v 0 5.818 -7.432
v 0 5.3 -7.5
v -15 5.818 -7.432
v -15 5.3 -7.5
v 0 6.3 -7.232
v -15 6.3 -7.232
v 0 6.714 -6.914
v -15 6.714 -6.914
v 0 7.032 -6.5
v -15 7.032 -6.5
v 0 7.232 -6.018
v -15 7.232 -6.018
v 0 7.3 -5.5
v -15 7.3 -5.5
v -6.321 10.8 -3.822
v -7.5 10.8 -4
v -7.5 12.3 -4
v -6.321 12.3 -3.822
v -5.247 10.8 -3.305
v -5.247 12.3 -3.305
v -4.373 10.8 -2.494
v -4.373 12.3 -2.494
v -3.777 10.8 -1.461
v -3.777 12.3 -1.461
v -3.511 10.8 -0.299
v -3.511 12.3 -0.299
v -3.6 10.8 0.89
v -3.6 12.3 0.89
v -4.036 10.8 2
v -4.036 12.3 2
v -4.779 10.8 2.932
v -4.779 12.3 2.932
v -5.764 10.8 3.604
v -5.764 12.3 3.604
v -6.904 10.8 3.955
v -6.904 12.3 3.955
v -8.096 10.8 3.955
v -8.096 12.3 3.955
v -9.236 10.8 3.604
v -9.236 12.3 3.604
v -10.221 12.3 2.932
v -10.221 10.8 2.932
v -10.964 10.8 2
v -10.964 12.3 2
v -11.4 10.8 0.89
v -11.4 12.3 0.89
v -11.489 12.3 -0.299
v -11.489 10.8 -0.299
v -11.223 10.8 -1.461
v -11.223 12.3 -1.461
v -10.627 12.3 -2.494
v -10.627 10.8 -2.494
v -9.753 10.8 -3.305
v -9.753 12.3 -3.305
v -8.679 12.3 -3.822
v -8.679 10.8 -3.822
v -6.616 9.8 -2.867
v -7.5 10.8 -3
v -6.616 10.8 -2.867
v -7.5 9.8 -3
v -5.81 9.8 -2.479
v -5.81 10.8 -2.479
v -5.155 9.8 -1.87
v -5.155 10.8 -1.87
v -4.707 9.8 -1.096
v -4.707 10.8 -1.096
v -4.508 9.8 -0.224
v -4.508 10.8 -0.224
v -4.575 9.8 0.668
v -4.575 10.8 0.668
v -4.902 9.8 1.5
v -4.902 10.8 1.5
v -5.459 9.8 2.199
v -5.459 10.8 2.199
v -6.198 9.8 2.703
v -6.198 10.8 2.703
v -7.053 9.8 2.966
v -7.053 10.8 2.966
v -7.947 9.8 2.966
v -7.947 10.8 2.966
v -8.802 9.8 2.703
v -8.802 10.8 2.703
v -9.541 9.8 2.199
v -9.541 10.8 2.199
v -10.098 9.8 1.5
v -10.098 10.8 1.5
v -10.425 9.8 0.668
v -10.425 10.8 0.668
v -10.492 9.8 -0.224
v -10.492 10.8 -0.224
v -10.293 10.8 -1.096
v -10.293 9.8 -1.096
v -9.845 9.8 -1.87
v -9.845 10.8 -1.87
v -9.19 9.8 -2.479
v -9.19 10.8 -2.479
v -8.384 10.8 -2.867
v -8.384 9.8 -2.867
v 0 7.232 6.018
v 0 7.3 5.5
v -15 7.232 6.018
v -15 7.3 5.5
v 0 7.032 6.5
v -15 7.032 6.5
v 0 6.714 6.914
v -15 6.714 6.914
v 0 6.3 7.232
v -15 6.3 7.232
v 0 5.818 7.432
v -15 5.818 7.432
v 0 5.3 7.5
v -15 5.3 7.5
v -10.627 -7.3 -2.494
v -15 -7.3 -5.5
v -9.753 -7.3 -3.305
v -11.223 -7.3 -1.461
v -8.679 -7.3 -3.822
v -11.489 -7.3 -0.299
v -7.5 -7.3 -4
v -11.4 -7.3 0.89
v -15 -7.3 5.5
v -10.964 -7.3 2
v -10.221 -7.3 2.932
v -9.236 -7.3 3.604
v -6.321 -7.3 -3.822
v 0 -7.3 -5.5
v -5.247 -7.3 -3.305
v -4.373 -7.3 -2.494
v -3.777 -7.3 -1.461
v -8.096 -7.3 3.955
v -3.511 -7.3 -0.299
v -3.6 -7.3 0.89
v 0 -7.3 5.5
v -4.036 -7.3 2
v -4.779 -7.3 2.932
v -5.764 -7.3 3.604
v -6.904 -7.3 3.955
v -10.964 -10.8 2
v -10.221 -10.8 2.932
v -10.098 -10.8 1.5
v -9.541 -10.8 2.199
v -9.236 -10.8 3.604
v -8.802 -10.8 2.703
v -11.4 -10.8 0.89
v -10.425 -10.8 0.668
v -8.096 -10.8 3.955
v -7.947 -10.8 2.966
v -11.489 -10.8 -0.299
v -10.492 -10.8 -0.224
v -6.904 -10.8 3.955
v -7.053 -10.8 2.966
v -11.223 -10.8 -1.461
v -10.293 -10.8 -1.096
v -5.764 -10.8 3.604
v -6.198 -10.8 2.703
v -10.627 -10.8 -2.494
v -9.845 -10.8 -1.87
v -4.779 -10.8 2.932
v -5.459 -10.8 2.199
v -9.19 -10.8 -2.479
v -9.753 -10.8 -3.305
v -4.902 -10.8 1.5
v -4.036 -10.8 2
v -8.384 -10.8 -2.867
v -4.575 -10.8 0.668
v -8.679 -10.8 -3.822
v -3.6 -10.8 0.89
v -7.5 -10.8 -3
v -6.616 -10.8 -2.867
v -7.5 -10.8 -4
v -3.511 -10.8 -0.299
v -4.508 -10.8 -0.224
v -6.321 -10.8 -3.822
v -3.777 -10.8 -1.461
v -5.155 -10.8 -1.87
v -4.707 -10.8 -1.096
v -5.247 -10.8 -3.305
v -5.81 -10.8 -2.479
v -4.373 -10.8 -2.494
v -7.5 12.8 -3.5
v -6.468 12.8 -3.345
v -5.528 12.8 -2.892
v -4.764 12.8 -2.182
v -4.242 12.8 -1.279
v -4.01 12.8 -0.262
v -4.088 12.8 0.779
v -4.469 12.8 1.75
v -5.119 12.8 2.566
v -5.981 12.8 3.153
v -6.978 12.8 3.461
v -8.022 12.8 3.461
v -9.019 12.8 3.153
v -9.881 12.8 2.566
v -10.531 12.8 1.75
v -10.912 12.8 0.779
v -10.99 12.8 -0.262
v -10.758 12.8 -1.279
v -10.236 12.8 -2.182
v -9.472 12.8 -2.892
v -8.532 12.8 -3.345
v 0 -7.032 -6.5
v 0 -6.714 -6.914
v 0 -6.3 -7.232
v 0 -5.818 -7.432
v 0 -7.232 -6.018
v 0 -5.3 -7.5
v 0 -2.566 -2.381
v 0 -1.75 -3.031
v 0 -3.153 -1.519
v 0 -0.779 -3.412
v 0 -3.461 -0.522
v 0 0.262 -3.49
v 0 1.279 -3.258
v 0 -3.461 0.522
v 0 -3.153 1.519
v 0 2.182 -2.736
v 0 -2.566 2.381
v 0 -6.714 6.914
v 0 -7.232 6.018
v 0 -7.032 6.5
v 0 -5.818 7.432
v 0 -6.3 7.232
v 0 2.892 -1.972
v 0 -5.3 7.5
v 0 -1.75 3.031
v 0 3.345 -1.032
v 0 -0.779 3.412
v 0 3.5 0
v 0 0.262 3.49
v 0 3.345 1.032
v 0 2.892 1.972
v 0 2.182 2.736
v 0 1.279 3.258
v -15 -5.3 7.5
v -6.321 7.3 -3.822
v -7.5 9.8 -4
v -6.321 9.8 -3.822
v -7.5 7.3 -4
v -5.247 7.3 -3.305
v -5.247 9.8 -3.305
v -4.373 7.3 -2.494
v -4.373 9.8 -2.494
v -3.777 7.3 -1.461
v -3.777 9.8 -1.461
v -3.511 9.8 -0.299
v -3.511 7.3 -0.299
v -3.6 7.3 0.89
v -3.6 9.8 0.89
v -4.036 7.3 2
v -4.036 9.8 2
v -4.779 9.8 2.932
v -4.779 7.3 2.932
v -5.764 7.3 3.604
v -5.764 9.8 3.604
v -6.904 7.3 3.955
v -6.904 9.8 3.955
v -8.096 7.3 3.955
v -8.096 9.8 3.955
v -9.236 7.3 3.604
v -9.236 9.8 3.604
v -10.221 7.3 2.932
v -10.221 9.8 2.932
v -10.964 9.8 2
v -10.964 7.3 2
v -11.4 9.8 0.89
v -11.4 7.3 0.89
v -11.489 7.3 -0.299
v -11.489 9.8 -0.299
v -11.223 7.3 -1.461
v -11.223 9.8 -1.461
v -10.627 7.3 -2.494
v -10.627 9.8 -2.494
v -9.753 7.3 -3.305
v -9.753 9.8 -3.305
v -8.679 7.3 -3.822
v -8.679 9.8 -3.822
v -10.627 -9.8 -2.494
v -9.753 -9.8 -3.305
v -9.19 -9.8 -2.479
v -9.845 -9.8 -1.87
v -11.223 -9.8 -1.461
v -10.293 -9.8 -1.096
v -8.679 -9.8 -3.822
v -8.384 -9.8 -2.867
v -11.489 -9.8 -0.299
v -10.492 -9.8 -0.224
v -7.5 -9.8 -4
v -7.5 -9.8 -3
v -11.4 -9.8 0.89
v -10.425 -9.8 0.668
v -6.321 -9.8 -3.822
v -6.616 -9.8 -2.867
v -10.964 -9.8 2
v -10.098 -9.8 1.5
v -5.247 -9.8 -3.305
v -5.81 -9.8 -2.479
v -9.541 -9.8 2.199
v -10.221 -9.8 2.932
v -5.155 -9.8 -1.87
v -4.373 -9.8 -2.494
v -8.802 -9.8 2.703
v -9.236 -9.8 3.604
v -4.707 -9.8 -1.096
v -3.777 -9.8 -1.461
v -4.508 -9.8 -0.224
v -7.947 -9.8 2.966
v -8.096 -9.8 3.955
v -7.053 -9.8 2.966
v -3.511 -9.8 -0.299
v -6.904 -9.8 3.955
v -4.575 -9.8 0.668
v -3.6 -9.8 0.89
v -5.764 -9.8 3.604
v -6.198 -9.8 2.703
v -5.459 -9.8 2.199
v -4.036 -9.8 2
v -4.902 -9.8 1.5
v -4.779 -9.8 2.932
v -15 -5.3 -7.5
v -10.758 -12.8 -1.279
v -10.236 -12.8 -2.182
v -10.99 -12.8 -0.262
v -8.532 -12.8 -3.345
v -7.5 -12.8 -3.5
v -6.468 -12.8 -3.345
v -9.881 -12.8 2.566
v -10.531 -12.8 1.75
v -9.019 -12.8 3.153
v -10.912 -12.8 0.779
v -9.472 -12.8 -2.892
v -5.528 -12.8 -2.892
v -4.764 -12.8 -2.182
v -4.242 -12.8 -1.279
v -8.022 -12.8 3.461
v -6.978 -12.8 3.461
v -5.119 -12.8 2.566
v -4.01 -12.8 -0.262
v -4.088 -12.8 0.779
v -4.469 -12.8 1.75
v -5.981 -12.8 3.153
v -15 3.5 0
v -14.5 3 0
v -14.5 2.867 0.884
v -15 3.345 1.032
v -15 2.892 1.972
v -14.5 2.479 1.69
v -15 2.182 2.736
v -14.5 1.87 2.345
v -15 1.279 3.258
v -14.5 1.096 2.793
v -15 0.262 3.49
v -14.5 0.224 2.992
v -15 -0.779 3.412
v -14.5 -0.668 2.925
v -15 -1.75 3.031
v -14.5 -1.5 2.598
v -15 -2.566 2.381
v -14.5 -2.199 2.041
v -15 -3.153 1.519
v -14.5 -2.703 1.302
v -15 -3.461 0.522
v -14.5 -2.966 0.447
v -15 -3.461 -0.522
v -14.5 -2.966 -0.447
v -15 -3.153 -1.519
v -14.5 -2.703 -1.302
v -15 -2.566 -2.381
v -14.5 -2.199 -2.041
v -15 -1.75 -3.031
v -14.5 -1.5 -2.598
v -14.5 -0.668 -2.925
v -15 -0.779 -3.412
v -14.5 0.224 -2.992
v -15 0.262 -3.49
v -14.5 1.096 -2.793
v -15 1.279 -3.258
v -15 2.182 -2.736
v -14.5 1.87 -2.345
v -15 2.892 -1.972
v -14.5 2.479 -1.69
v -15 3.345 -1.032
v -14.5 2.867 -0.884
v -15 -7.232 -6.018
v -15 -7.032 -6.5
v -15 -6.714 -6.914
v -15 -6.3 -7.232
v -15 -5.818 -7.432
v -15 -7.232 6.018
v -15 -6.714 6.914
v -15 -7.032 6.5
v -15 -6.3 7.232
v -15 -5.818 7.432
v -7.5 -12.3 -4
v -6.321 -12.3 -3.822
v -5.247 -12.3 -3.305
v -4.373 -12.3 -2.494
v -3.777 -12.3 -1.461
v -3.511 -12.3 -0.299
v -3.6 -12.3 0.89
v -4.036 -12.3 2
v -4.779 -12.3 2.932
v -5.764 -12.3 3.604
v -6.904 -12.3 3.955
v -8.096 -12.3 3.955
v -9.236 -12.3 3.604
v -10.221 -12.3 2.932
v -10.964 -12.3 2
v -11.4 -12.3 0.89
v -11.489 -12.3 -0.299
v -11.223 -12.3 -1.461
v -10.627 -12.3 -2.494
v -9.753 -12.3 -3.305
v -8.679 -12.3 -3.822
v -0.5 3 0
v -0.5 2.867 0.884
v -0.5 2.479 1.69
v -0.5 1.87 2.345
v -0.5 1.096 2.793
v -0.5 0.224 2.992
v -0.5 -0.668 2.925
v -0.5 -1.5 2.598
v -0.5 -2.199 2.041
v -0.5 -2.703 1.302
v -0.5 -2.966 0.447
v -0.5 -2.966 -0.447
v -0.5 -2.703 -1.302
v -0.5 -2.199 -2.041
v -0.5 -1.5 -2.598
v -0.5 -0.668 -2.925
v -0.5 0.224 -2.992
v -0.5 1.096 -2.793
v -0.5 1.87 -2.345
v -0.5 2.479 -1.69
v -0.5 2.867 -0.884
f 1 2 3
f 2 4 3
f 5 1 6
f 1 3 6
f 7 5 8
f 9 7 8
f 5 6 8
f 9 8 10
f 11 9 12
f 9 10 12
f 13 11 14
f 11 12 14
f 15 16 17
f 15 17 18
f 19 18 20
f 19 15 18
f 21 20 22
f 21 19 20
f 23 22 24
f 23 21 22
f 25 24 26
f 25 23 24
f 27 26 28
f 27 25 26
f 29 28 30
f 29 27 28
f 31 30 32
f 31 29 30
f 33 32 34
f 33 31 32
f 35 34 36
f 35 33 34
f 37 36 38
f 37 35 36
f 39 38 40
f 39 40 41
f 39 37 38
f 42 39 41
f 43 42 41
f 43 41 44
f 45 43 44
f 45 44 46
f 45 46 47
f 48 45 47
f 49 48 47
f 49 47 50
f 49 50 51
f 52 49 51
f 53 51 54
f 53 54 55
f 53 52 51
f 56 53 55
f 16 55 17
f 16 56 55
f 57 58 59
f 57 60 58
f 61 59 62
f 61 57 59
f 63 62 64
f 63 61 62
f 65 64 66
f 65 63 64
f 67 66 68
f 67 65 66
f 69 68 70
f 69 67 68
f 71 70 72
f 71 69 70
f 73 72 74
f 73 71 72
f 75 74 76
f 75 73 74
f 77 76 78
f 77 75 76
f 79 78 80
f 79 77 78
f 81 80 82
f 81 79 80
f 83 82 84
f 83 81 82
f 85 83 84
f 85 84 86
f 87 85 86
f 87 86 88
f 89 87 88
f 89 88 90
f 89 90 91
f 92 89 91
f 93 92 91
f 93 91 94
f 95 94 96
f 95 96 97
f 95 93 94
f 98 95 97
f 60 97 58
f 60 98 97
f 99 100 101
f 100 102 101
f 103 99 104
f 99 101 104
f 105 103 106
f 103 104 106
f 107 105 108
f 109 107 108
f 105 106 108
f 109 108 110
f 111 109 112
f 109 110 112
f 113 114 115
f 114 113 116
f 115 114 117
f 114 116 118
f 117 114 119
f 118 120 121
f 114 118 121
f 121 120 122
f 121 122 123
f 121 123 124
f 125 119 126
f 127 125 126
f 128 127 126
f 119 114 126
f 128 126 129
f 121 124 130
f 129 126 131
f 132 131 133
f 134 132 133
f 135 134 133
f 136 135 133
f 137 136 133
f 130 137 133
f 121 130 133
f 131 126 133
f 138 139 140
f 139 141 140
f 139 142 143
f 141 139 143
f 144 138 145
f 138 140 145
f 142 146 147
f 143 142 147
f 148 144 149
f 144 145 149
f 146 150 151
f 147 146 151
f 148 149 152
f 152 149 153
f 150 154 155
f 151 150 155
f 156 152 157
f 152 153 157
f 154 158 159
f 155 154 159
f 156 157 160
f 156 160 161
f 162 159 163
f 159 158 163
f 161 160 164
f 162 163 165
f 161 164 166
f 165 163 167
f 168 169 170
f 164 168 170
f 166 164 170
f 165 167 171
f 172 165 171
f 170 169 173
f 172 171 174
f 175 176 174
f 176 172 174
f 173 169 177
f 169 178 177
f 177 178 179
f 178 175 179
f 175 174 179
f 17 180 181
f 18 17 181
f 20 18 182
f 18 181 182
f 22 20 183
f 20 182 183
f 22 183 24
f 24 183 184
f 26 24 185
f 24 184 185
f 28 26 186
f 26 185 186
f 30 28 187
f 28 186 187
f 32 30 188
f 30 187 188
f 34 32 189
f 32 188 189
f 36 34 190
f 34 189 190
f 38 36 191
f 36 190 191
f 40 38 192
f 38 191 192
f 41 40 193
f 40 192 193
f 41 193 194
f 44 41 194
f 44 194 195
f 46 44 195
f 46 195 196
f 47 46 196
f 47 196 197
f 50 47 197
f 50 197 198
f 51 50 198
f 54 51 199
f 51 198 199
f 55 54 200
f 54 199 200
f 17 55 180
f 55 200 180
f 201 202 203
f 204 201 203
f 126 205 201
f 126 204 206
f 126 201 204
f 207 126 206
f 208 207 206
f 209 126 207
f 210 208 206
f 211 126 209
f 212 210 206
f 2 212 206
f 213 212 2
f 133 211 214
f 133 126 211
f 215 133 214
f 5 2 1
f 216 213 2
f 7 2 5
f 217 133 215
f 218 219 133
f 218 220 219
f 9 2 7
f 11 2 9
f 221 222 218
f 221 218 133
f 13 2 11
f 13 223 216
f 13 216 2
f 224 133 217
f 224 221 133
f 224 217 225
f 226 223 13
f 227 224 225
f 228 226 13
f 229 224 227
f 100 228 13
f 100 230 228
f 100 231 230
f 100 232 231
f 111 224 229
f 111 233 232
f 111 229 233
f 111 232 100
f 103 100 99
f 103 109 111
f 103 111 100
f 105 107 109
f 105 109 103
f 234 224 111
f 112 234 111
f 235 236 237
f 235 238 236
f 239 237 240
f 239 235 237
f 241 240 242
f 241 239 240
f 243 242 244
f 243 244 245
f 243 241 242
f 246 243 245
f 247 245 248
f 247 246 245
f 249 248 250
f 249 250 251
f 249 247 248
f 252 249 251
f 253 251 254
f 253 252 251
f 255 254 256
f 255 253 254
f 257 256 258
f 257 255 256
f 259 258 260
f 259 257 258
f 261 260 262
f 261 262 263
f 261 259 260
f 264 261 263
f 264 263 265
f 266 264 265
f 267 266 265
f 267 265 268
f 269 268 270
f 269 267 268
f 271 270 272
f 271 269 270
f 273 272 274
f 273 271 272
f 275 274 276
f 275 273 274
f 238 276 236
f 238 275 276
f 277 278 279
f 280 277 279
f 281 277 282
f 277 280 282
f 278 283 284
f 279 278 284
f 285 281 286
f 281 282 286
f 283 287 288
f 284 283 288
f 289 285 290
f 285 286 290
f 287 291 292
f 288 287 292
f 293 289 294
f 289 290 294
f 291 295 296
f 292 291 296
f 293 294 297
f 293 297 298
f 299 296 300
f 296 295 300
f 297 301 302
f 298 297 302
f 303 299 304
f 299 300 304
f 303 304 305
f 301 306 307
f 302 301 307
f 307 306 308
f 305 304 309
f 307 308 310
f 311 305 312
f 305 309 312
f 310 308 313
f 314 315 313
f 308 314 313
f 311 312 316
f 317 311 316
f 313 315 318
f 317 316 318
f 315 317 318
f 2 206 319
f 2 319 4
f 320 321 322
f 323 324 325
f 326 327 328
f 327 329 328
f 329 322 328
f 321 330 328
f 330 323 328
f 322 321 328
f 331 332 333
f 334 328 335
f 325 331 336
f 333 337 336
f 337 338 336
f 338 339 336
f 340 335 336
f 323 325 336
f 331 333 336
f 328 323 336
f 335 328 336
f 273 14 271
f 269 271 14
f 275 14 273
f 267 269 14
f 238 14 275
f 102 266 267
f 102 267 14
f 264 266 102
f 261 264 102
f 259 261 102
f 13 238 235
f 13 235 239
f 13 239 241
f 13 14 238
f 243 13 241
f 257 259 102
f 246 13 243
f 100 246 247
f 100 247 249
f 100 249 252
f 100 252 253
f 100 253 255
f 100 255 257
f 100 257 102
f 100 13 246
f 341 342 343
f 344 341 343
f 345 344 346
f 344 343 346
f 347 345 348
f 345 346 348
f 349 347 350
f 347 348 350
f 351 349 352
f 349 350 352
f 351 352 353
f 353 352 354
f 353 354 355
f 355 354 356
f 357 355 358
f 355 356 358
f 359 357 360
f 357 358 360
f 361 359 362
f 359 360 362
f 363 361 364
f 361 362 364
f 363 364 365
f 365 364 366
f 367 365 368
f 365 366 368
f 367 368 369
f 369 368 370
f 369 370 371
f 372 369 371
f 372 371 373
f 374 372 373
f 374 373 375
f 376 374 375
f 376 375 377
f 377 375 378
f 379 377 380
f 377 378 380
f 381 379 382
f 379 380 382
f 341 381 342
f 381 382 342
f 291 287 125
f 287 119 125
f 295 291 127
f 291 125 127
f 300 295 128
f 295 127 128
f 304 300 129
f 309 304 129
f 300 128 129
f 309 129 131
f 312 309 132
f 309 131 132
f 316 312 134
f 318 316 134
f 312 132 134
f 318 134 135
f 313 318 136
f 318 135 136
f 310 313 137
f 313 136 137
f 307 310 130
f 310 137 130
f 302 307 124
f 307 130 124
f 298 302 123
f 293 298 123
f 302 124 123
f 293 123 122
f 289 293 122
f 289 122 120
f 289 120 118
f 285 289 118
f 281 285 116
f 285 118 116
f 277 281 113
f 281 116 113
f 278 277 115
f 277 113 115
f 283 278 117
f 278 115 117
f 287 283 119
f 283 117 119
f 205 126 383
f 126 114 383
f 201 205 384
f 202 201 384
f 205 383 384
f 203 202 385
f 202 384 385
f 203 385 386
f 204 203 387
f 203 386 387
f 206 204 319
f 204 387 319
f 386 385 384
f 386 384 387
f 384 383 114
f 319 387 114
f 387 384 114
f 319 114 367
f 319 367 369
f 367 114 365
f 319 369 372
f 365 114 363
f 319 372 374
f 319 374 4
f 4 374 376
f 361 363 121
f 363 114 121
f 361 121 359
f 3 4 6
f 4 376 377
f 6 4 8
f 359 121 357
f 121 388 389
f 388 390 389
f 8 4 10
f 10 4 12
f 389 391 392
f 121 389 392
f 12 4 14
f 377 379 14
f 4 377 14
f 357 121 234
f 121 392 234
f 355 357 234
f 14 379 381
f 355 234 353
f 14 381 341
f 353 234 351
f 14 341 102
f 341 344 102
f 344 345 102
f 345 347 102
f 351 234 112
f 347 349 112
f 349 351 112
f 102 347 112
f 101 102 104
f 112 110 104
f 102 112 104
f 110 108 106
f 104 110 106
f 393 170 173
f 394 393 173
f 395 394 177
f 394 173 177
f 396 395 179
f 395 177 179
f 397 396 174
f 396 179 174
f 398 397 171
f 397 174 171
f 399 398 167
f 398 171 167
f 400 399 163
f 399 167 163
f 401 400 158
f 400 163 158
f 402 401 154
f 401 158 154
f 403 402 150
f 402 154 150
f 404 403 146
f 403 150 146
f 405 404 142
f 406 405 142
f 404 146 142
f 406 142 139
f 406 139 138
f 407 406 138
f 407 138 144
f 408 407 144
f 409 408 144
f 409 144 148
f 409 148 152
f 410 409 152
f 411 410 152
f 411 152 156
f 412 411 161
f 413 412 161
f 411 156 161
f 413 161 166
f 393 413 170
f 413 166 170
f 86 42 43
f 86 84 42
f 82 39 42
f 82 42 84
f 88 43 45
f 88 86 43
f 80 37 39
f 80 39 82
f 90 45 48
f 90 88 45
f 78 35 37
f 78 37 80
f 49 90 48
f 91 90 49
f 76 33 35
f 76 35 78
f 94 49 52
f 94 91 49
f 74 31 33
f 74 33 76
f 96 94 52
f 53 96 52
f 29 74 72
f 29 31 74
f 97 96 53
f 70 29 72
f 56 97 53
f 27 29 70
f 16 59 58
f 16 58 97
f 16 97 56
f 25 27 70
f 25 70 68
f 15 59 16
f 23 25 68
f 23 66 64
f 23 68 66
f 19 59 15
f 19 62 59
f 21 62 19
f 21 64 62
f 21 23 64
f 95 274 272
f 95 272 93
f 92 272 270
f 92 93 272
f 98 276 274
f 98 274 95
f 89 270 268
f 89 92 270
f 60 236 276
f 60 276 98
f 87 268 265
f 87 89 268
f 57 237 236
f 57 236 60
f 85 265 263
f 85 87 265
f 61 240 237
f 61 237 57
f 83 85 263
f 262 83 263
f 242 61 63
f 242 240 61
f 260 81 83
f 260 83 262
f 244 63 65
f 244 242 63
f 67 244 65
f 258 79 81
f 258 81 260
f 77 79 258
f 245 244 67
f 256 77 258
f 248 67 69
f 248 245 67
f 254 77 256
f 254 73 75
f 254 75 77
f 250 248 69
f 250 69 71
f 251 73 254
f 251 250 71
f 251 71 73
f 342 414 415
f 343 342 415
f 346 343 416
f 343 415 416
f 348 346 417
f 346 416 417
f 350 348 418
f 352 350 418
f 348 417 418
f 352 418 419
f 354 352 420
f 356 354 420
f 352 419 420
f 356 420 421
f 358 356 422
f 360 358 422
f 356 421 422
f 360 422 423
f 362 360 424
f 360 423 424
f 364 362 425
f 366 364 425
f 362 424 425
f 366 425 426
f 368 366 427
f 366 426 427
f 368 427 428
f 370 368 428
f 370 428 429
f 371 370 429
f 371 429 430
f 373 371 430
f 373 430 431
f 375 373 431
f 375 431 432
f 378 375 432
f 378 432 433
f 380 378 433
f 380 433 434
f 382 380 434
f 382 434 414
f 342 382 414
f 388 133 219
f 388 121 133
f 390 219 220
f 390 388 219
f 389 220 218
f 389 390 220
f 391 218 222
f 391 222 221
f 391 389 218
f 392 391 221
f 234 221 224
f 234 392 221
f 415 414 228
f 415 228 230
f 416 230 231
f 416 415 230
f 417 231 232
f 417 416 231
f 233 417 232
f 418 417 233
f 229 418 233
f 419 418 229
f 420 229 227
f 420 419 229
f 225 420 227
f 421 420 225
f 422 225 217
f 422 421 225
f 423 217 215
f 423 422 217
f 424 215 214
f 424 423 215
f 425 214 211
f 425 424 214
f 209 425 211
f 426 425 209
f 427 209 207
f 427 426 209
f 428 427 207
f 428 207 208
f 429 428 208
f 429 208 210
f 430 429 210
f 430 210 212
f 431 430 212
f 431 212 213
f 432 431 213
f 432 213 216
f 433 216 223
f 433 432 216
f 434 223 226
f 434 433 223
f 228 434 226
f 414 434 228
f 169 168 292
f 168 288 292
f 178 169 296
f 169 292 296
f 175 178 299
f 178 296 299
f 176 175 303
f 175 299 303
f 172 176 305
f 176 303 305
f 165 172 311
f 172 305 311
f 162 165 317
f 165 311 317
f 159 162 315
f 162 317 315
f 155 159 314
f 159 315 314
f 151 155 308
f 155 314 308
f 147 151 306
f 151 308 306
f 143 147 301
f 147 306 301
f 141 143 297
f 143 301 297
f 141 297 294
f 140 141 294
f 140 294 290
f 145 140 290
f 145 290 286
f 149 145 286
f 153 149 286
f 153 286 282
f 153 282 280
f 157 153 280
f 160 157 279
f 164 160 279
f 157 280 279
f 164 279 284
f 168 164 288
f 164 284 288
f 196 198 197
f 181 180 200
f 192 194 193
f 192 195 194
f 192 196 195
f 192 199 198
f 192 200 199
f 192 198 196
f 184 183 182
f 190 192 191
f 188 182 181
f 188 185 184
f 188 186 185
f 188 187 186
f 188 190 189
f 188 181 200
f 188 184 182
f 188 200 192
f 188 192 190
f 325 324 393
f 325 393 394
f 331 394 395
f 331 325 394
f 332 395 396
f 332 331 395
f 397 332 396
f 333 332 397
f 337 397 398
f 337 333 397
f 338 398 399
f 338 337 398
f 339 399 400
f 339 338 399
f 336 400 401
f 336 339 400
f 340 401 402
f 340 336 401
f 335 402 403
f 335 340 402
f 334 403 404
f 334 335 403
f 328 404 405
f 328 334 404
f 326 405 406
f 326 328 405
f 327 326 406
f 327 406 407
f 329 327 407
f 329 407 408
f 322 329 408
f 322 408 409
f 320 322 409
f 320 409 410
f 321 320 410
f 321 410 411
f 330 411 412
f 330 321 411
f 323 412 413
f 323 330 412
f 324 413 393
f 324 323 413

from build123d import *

# Parameters (mm, degrees)
F0_W     = 14.6
F0_H     = 15
F1_DEPTH = 15
F2_R     = 2
F3_R     = 3
F4_DEPTH = 15.001
F5_SIZE2 = 0.5
F5_SIZE  = 0.5
F9_SIZE2 = 0.5
F9_SIZE  = 0.5


# Not quite as in the source:
# - a pattern or mirror of a feature is missing from the dataset's text; its kind, count and spacing are read off the source's solid


with BuildPart() as f1:
    # F0 (on Right) → F1 (new body)
    with BuildSketch(Plane.YZ):
        Rectangle(F0_W, F0_H)
    extrude(amount=-F1_DEPTH)

    # F2
    f2_edges = [f1.edges().sort_by_distance(p)[0] for p in [
        (-7.5, -7.3, 7.5),
        (-7.5, 7.3, 7.5),
        (-7.5, -7.3, -7.5),
        (-7.5, 7.3, -7.5),
    ]]
    fillet(f2_edges, radius=F2_R)

    # F3 (on face) → F4 (cut, through all)
    with BuildSketch(Plane.YZ):
        Circle(F3_R)
    extrude(amount=-F4_DEPTH, mode=Mode.SUBTRACT)

    # F5
    f5_edges = [f1.edges().sort_by_distance(p)[0] for p in [
        (0, -3, 0),
        (-7.5, 3, 0),
        (-15, -3, 0),
    ]]
    chamfer(f5_edges, length=F5_SIZE, length2=F5_SIZE2)

    # F7 (on mid) → F8 (revolve)
    with BuildSketch(Plane.YZ.offset(-7.5)):
        Polygon((-7.3, 0), (-12.8, 0), (-12.8, -4), (-10.8, -4), (-10.8, -3), (-9.8, -3), (-9.8, -4), (-7.3, -4), align=None)
    f8 = revolve(axis=Axis((-7.5, -3.65, 0), (0, -1, 0)))

    # F8_copies: F8 across plane
    add(f8.mirror(Plane.ZX))

    # F9
    f9_edges = [f1.edges().sort_by_distance(p)[0] for p in [
        (-7.5, -12.8, 4),
        (-7.5, 12.8, 4),
    ]]
    chamfer(f9_edges, length=F9_SIZE, length2=F9_SIZE2)


solid = f1.part
